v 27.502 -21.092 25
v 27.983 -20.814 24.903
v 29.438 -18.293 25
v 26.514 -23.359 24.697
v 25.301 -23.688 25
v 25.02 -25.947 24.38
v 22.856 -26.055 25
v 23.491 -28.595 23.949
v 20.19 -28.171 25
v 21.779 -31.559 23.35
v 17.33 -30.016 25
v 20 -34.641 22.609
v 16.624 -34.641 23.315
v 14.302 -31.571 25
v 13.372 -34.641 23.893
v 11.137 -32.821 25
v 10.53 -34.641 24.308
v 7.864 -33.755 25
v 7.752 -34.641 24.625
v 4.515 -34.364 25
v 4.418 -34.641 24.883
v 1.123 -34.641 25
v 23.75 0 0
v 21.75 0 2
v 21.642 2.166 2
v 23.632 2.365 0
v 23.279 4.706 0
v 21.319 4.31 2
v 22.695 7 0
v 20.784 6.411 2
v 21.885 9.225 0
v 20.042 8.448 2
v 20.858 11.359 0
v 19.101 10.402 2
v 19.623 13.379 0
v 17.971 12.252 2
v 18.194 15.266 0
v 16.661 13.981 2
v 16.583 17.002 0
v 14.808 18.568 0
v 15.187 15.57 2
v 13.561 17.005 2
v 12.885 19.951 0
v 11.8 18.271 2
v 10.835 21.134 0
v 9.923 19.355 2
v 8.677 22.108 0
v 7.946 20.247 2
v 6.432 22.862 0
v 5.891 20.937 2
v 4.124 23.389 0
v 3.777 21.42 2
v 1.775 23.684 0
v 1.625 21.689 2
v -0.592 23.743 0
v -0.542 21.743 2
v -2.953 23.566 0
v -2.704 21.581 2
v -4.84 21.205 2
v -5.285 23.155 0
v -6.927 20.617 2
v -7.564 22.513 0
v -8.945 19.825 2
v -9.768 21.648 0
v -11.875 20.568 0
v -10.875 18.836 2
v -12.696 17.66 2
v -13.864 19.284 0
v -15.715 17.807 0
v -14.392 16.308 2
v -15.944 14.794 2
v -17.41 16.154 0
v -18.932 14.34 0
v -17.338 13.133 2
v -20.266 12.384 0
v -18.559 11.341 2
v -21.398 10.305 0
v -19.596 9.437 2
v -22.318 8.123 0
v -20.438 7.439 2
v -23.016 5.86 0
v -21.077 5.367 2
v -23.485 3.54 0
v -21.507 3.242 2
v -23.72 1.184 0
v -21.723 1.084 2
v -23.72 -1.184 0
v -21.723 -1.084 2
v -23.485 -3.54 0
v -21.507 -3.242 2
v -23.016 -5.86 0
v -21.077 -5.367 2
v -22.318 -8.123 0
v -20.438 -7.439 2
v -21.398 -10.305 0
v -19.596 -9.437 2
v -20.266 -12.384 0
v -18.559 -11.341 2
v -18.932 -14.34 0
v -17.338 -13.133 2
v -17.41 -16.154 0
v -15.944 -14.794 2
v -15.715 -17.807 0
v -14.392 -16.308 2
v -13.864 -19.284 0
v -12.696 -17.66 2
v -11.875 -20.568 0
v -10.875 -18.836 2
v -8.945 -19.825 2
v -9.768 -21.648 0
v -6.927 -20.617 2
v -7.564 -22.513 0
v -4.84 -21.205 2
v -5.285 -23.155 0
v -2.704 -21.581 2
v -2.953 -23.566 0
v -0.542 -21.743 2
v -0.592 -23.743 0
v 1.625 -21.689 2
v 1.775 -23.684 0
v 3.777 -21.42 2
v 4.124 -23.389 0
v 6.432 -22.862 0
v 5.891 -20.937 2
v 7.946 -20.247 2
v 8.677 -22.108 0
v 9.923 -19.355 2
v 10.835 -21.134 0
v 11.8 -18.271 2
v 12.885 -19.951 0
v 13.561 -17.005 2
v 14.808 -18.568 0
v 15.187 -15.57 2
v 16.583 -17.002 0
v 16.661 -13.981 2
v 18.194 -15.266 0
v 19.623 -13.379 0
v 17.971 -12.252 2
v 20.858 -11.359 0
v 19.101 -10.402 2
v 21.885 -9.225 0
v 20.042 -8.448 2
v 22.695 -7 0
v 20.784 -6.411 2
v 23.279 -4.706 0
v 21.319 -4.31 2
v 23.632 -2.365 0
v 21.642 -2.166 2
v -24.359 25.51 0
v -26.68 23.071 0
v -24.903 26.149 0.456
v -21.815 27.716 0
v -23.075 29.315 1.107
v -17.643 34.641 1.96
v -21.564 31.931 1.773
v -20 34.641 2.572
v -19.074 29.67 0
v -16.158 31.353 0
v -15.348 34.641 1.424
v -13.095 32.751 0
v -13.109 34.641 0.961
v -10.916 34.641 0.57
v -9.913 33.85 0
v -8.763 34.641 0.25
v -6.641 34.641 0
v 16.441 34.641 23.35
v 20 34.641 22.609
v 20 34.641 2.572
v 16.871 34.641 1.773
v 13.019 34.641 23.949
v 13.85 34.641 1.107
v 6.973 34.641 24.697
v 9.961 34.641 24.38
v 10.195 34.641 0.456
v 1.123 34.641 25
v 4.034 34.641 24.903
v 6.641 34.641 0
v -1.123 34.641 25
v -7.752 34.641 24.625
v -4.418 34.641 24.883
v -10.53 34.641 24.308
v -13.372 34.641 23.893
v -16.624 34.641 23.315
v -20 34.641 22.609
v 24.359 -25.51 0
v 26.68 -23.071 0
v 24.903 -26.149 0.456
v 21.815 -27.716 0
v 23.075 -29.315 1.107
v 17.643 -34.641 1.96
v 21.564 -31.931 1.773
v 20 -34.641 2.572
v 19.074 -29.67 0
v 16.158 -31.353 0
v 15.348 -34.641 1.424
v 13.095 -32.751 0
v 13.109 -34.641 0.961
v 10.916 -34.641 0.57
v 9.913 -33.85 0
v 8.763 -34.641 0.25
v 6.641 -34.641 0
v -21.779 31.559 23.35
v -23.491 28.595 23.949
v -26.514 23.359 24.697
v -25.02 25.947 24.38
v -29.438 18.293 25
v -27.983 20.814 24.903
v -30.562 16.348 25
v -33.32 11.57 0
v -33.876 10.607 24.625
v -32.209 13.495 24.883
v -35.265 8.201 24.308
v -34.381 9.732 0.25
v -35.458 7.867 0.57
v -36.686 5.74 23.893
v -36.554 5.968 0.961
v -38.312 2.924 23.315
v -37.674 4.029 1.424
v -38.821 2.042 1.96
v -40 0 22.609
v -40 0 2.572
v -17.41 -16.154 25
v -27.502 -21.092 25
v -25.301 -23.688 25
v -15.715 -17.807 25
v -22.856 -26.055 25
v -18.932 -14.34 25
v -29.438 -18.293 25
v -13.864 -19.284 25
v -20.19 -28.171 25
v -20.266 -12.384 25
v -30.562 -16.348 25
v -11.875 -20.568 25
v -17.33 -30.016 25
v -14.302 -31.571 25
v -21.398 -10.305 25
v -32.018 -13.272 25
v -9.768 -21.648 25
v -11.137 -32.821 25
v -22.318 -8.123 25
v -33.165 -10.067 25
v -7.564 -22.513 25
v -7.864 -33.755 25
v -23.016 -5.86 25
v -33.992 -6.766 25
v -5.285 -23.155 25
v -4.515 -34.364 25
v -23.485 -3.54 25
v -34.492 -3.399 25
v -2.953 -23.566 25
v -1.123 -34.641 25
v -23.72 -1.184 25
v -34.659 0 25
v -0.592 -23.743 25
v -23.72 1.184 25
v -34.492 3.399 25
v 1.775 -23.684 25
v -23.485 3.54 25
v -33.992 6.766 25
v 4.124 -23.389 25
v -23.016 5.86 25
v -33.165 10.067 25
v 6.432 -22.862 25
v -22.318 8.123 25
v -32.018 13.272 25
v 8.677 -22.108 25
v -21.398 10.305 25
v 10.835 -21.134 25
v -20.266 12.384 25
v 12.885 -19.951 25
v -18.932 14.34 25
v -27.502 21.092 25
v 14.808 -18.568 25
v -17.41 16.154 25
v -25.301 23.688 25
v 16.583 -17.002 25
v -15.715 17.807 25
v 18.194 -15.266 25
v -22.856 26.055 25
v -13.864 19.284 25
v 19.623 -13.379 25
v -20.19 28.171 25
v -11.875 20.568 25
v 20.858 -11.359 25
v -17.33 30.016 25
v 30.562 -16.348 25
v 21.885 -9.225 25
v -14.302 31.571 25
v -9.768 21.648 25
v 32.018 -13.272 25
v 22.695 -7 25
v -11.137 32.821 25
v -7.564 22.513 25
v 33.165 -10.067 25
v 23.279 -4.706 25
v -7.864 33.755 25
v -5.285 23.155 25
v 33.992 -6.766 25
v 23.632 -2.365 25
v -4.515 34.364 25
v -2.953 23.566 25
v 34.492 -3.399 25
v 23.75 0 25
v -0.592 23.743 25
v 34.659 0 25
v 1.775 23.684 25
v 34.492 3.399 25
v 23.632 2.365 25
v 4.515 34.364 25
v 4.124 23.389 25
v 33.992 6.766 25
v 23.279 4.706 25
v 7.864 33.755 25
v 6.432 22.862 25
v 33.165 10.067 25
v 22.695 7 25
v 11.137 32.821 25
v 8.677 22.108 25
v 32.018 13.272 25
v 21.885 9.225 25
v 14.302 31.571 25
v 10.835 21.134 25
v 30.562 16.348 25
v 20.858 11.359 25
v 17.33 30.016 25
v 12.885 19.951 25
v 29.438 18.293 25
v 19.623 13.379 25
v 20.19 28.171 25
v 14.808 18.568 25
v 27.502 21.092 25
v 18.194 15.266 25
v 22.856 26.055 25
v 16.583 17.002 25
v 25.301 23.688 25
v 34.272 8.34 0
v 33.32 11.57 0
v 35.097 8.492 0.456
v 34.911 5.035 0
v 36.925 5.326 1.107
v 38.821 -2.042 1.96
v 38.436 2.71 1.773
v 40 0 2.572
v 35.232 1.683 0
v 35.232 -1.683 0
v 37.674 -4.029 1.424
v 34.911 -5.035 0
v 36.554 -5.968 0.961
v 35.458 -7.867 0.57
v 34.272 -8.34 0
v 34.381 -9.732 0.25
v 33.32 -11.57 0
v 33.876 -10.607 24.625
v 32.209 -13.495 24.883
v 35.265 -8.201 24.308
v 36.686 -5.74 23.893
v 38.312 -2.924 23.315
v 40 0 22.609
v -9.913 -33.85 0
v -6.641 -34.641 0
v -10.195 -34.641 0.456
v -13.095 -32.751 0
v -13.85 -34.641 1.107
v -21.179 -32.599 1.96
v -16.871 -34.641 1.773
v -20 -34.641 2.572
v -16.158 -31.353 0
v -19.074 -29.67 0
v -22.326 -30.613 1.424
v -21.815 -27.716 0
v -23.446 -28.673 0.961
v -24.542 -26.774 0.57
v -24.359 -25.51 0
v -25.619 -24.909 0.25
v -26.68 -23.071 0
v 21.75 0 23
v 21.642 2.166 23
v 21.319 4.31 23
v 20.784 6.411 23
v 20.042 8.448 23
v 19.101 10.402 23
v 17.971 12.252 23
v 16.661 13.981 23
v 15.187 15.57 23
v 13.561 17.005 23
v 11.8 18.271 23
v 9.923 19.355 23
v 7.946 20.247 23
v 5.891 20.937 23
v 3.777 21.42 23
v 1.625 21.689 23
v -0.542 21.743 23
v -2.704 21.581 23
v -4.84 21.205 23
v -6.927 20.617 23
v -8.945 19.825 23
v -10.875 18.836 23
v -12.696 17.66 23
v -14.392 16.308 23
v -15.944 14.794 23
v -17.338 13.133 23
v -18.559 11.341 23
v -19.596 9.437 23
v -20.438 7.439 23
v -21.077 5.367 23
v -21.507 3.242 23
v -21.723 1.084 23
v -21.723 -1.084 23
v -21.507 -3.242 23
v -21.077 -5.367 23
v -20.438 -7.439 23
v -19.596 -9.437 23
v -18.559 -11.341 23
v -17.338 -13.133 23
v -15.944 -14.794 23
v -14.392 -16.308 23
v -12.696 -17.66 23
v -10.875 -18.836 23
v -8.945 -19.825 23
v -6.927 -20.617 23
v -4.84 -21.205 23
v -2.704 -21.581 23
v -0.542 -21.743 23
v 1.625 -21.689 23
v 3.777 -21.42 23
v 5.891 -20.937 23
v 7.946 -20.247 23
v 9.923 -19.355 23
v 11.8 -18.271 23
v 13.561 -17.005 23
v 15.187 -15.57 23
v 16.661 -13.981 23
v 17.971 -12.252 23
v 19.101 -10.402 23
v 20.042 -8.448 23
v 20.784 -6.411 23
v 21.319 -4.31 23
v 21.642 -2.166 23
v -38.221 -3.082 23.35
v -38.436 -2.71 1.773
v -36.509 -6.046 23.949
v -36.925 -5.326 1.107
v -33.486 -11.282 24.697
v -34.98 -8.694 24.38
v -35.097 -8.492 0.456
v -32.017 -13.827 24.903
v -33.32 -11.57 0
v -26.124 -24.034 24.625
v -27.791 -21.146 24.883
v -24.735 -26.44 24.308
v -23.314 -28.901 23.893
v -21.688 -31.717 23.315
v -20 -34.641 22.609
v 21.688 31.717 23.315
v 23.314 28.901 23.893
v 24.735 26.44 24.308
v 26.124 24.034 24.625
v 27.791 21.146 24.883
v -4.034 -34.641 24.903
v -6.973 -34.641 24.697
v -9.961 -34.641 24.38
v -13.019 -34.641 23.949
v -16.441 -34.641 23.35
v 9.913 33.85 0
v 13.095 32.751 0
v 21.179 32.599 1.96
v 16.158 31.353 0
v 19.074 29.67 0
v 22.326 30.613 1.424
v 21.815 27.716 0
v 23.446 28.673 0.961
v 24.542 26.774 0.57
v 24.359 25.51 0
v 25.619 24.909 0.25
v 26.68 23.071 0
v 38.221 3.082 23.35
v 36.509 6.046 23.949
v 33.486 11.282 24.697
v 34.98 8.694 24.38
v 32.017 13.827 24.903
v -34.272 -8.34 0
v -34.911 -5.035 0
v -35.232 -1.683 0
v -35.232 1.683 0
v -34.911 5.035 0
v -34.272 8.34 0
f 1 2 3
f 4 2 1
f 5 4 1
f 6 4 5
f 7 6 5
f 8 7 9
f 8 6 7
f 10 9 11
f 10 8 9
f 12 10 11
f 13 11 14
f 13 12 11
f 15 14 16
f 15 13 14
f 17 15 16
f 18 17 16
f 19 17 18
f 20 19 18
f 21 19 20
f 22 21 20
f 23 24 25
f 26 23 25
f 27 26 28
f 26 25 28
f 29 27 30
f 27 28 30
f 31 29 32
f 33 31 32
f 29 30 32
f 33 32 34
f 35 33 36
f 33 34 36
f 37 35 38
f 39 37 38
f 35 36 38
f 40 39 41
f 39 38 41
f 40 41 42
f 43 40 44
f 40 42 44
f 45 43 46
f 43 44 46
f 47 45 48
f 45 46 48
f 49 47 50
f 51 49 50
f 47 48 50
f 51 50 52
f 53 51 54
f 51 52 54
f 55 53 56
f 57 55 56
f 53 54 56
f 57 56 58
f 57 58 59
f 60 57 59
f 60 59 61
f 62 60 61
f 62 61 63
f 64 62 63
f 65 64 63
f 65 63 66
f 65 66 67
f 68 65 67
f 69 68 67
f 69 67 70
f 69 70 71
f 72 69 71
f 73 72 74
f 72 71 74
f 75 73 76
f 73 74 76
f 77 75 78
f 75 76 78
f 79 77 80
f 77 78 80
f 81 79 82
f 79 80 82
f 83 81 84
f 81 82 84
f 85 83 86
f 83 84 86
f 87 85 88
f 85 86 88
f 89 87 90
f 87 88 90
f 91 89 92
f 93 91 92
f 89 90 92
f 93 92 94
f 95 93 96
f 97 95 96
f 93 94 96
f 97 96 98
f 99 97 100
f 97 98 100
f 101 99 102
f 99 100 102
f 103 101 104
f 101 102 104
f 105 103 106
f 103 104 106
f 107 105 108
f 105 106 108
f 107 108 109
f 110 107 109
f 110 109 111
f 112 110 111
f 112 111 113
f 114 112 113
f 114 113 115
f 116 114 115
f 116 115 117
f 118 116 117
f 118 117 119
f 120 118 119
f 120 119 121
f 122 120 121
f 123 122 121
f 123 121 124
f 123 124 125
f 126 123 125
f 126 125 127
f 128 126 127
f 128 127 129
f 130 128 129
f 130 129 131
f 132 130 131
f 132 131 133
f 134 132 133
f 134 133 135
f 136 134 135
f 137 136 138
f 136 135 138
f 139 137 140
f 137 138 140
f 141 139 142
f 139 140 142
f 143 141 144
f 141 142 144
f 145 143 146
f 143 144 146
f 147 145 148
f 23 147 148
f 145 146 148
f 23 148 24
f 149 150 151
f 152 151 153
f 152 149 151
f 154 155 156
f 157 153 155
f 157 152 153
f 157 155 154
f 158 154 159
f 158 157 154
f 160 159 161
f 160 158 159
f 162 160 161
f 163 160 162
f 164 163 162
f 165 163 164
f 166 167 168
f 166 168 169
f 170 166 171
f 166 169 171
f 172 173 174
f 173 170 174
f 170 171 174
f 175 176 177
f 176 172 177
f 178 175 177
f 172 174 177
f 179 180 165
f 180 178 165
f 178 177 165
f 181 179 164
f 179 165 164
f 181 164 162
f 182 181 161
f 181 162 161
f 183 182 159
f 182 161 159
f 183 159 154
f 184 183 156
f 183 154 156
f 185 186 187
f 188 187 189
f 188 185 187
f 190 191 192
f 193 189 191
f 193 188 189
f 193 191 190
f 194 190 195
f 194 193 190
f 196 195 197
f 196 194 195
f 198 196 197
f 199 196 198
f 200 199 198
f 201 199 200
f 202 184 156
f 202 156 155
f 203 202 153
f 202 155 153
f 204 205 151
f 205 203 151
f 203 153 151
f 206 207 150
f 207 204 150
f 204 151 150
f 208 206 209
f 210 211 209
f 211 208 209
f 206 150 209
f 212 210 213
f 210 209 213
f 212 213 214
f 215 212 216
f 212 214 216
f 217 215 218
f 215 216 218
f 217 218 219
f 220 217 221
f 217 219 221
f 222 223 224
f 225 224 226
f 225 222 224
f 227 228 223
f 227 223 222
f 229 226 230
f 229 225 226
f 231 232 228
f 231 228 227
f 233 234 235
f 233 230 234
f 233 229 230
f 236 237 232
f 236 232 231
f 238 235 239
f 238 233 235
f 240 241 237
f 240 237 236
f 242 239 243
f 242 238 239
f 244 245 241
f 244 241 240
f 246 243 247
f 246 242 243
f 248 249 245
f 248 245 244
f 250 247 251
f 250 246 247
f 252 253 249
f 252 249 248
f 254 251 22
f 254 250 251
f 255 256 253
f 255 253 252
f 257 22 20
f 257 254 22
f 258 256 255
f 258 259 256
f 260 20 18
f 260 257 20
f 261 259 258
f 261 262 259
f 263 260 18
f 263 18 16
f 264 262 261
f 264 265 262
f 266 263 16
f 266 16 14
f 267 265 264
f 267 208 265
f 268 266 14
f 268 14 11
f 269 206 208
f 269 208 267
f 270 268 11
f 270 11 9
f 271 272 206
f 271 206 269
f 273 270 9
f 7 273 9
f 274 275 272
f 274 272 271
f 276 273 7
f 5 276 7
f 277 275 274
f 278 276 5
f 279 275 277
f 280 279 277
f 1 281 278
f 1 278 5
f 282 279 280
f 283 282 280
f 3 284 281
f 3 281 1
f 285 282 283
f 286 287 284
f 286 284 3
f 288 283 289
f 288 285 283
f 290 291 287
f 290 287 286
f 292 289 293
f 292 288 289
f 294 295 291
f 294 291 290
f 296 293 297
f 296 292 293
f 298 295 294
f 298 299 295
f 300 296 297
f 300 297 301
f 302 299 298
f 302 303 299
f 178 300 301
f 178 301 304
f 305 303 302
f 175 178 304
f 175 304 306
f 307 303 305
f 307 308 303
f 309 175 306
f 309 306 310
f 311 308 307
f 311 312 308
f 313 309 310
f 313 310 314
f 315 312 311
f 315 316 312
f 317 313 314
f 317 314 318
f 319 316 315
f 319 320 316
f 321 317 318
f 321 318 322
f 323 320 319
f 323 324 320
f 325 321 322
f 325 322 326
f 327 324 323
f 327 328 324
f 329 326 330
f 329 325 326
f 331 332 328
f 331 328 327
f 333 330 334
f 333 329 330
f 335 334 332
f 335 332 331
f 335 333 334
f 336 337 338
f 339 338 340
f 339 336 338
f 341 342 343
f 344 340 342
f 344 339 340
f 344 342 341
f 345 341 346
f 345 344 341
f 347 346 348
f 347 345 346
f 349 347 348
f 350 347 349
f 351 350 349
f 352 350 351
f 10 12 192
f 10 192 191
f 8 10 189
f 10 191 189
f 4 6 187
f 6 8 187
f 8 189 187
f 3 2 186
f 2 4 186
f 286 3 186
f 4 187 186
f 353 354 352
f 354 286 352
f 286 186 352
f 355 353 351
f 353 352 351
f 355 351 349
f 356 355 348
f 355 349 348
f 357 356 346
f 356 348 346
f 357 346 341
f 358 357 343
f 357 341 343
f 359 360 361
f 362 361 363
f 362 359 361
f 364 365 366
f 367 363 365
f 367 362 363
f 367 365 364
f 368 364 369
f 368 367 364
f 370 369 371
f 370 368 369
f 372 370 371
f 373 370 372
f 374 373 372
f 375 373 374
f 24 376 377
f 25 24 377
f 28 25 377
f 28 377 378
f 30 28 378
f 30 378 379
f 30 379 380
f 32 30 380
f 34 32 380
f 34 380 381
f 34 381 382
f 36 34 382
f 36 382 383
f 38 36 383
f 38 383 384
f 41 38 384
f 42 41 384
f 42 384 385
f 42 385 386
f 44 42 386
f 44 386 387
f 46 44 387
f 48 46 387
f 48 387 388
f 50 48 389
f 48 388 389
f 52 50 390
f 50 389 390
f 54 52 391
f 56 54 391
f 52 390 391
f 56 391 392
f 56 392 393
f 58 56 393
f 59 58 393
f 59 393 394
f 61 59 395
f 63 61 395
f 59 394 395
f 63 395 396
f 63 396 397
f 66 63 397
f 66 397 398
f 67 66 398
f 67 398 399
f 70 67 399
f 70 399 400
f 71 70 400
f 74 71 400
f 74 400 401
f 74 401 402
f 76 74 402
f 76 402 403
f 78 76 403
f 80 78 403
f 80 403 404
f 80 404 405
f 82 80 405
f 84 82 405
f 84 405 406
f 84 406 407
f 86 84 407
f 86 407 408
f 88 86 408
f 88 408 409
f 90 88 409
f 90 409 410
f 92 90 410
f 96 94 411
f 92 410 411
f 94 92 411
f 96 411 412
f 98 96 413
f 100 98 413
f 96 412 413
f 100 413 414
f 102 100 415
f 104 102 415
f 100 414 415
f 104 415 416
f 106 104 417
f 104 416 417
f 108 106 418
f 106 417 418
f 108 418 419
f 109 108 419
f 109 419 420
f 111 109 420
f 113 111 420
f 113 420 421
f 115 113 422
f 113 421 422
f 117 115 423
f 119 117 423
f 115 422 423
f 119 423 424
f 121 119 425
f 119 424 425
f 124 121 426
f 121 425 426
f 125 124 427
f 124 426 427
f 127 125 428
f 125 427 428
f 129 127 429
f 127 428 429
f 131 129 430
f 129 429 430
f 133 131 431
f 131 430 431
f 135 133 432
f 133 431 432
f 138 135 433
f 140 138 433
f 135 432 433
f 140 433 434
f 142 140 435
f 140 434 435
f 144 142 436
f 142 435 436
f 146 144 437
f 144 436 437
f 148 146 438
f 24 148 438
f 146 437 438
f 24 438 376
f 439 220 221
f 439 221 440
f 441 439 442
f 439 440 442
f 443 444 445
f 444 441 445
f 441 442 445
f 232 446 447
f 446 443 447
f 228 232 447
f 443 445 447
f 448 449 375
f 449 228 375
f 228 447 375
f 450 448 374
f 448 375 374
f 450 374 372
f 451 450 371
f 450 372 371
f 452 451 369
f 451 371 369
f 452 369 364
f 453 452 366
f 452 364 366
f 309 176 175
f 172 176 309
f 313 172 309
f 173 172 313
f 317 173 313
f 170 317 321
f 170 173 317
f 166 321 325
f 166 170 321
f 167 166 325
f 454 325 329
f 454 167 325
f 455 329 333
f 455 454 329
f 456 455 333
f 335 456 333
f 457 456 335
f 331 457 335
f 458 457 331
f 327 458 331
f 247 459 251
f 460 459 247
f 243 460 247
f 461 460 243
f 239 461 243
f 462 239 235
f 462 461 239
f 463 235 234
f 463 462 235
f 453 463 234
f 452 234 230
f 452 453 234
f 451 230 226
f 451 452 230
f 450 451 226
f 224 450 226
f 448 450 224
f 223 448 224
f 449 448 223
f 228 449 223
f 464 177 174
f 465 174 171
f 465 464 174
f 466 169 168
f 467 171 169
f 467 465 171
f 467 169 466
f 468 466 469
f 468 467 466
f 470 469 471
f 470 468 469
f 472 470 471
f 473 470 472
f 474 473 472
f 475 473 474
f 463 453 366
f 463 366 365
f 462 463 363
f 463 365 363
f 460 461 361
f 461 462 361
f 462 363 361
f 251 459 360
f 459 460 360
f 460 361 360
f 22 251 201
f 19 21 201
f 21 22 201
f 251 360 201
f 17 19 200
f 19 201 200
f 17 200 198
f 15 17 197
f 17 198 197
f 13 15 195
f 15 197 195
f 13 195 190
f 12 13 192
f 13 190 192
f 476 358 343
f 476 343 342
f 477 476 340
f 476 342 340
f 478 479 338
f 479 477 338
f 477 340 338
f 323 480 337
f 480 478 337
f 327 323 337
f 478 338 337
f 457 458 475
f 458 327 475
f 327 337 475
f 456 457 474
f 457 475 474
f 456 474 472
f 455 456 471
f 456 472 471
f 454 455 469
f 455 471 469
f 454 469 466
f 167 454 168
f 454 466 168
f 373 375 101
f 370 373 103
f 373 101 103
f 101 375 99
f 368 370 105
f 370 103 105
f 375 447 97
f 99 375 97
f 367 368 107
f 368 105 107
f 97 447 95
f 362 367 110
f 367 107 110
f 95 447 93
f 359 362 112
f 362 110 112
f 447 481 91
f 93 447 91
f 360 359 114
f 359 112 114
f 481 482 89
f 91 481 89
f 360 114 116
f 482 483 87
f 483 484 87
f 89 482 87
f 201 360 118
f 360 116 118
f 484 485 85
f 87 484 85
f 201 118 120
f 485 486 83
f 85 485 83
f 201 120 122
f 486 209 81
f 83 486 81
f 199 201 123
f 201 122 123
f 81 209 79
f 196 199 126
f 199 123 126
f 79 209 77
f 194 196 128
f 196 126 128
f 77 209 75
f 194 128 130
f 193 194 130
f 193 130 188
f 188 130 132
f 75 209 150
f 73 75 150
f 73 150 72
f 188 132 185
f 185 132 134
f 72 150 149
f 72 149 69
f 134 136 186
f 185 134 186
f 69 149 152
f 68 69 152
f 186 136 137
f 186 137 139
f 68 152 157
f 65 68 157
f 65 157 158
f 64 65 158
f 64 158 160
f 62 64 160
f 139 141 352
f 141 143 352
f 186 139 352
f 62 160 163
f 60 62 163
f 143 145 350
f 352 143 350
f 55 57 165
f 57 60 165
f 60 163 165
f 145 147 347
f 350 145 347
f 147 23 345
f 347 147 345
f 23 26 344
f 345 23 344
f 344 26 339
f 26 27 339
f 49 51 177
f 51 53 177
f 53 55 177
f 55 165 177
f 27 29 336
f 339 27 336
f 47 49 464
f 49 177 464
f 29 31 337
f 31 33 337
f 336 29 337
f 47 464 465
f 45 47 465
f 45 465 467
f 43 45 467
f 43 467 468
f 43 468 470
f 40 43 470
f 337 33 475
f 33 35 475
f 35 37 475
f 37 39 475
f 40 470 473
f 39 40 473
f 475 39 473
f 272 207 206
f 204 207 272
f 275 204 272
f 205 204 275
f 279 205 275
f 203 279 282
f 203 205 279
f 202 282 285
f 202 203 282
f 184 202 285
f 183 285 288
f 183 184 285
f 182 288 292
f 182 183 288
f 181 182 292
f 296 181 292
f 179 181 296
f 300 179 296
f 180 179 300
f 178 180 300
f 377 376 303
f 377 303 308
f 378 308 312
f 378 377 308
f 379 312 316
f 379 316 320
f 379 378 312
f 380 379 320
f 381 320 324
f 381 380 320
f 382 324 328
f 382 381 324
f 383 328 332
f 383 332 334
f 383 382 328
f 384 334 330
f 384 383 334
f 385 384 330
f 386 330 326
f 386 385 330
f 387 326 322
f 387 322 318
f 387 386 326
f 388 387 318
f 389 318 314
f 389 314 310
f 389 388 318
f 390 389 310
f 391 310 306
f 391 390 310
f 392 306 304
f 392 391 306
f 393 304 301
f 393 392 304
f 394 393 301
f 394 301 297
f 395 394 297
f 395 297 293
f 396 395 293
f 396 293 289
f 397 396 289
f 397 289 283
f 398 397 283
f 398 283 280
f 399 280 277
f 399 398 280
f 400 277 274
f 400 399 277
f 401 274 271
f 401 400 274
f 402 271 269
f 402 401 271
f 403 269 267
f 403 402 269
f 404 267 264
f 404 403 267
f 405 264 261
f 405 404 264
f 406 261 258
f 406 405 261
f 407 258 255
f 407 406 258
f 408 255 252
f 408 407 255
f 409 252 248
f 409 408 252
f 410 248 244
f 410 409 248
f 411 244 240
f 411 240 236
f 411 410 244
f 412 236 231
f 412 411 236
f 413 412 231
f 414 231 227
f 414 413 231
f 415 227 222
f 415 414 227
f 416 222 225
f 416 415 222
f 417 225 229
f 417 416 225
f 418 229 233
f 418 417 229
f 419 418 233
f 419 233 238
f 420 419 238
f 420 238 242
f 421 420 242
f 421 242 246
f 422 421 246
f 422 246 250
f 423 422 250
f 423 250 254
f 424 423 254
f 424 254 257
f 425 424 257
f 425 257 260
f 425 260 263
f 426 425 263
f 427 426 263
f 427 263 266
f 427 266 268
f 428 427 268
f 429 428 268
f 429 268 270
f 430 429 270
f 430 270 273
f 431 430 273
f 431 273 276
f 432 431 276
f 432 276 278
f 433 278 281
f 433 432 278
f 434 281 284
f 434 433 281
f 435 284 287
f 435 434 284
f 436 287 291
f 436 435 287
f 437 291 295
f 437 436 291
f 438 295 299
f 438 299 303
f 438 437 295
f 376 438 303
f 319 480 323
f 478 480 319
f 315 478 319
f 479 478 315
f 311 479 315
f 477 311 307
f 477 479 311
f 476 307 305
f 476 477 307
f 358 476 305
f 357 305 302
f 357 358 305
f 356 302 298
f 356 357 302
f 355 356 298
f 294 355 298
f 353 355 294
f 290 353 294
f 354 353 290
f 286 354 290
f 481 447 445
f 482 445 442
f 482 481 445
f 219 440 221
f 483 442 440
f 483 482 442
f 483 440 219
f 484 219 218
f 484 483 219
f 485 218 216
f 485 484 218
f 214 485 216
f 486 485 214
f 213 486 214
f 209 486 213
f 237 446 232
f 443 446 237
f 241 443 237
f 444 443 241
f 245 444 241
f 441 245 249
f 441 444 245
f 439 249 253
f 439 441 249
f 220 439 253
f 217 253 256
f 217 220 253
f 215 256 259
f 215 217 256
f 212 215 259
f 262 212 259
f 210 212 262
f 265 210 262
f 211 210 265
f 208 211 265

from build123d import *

# Parameters (mm, degrees)
F1_DEPTH = 25
F2_R     = 21.75
F3_DEPTH = 25.001
F4_SIZE  = 2


with BuildPart() as f1:
    # F0 (on Top) → F1 (new body)
    with BuildSketch(Plane.XY):
        Polygon((20, 34.641016), (-20, 34.641016), (-40, 0), (-20, -34.641016), (20, -34.641016), (40, 0), align=None)
    extrude(amount=F1_DEPTH)

    # F2 (on face) → F3 (cut, through all)
    with BuildSketch(Plane.XY.offset(25)):
        Circle(F2_R)
    extrude(amount=-F3_DEPTH, mode=Mode.SUBTRACT)

    # F4
    f4_edges = [f1.edges().sort_by_distance(p)[0] for p in [
        (-21.75, 0, 0),
        (-21.75, 0, 25),
    ]]
    chamfer(f4_edges, length=F4_SIZE)

    # F5 (on Front) → F6 (revolve, cut)
    with BuildSketch(Plane.XZ):
        Polygon((42.406738, 25.509455), (33.521101, 25.509455), (42.406738, 21.53198), align=None)
        Polygon((42.136625, 3.734692), (33.521101, -0.952422), (42.136625, -0.952422), align=None)
    revolve(axis=Axis((0, 0, 7.913062), (0, 0, -1)), mode=Mode.SUBTRACT)


solid = f1.part
